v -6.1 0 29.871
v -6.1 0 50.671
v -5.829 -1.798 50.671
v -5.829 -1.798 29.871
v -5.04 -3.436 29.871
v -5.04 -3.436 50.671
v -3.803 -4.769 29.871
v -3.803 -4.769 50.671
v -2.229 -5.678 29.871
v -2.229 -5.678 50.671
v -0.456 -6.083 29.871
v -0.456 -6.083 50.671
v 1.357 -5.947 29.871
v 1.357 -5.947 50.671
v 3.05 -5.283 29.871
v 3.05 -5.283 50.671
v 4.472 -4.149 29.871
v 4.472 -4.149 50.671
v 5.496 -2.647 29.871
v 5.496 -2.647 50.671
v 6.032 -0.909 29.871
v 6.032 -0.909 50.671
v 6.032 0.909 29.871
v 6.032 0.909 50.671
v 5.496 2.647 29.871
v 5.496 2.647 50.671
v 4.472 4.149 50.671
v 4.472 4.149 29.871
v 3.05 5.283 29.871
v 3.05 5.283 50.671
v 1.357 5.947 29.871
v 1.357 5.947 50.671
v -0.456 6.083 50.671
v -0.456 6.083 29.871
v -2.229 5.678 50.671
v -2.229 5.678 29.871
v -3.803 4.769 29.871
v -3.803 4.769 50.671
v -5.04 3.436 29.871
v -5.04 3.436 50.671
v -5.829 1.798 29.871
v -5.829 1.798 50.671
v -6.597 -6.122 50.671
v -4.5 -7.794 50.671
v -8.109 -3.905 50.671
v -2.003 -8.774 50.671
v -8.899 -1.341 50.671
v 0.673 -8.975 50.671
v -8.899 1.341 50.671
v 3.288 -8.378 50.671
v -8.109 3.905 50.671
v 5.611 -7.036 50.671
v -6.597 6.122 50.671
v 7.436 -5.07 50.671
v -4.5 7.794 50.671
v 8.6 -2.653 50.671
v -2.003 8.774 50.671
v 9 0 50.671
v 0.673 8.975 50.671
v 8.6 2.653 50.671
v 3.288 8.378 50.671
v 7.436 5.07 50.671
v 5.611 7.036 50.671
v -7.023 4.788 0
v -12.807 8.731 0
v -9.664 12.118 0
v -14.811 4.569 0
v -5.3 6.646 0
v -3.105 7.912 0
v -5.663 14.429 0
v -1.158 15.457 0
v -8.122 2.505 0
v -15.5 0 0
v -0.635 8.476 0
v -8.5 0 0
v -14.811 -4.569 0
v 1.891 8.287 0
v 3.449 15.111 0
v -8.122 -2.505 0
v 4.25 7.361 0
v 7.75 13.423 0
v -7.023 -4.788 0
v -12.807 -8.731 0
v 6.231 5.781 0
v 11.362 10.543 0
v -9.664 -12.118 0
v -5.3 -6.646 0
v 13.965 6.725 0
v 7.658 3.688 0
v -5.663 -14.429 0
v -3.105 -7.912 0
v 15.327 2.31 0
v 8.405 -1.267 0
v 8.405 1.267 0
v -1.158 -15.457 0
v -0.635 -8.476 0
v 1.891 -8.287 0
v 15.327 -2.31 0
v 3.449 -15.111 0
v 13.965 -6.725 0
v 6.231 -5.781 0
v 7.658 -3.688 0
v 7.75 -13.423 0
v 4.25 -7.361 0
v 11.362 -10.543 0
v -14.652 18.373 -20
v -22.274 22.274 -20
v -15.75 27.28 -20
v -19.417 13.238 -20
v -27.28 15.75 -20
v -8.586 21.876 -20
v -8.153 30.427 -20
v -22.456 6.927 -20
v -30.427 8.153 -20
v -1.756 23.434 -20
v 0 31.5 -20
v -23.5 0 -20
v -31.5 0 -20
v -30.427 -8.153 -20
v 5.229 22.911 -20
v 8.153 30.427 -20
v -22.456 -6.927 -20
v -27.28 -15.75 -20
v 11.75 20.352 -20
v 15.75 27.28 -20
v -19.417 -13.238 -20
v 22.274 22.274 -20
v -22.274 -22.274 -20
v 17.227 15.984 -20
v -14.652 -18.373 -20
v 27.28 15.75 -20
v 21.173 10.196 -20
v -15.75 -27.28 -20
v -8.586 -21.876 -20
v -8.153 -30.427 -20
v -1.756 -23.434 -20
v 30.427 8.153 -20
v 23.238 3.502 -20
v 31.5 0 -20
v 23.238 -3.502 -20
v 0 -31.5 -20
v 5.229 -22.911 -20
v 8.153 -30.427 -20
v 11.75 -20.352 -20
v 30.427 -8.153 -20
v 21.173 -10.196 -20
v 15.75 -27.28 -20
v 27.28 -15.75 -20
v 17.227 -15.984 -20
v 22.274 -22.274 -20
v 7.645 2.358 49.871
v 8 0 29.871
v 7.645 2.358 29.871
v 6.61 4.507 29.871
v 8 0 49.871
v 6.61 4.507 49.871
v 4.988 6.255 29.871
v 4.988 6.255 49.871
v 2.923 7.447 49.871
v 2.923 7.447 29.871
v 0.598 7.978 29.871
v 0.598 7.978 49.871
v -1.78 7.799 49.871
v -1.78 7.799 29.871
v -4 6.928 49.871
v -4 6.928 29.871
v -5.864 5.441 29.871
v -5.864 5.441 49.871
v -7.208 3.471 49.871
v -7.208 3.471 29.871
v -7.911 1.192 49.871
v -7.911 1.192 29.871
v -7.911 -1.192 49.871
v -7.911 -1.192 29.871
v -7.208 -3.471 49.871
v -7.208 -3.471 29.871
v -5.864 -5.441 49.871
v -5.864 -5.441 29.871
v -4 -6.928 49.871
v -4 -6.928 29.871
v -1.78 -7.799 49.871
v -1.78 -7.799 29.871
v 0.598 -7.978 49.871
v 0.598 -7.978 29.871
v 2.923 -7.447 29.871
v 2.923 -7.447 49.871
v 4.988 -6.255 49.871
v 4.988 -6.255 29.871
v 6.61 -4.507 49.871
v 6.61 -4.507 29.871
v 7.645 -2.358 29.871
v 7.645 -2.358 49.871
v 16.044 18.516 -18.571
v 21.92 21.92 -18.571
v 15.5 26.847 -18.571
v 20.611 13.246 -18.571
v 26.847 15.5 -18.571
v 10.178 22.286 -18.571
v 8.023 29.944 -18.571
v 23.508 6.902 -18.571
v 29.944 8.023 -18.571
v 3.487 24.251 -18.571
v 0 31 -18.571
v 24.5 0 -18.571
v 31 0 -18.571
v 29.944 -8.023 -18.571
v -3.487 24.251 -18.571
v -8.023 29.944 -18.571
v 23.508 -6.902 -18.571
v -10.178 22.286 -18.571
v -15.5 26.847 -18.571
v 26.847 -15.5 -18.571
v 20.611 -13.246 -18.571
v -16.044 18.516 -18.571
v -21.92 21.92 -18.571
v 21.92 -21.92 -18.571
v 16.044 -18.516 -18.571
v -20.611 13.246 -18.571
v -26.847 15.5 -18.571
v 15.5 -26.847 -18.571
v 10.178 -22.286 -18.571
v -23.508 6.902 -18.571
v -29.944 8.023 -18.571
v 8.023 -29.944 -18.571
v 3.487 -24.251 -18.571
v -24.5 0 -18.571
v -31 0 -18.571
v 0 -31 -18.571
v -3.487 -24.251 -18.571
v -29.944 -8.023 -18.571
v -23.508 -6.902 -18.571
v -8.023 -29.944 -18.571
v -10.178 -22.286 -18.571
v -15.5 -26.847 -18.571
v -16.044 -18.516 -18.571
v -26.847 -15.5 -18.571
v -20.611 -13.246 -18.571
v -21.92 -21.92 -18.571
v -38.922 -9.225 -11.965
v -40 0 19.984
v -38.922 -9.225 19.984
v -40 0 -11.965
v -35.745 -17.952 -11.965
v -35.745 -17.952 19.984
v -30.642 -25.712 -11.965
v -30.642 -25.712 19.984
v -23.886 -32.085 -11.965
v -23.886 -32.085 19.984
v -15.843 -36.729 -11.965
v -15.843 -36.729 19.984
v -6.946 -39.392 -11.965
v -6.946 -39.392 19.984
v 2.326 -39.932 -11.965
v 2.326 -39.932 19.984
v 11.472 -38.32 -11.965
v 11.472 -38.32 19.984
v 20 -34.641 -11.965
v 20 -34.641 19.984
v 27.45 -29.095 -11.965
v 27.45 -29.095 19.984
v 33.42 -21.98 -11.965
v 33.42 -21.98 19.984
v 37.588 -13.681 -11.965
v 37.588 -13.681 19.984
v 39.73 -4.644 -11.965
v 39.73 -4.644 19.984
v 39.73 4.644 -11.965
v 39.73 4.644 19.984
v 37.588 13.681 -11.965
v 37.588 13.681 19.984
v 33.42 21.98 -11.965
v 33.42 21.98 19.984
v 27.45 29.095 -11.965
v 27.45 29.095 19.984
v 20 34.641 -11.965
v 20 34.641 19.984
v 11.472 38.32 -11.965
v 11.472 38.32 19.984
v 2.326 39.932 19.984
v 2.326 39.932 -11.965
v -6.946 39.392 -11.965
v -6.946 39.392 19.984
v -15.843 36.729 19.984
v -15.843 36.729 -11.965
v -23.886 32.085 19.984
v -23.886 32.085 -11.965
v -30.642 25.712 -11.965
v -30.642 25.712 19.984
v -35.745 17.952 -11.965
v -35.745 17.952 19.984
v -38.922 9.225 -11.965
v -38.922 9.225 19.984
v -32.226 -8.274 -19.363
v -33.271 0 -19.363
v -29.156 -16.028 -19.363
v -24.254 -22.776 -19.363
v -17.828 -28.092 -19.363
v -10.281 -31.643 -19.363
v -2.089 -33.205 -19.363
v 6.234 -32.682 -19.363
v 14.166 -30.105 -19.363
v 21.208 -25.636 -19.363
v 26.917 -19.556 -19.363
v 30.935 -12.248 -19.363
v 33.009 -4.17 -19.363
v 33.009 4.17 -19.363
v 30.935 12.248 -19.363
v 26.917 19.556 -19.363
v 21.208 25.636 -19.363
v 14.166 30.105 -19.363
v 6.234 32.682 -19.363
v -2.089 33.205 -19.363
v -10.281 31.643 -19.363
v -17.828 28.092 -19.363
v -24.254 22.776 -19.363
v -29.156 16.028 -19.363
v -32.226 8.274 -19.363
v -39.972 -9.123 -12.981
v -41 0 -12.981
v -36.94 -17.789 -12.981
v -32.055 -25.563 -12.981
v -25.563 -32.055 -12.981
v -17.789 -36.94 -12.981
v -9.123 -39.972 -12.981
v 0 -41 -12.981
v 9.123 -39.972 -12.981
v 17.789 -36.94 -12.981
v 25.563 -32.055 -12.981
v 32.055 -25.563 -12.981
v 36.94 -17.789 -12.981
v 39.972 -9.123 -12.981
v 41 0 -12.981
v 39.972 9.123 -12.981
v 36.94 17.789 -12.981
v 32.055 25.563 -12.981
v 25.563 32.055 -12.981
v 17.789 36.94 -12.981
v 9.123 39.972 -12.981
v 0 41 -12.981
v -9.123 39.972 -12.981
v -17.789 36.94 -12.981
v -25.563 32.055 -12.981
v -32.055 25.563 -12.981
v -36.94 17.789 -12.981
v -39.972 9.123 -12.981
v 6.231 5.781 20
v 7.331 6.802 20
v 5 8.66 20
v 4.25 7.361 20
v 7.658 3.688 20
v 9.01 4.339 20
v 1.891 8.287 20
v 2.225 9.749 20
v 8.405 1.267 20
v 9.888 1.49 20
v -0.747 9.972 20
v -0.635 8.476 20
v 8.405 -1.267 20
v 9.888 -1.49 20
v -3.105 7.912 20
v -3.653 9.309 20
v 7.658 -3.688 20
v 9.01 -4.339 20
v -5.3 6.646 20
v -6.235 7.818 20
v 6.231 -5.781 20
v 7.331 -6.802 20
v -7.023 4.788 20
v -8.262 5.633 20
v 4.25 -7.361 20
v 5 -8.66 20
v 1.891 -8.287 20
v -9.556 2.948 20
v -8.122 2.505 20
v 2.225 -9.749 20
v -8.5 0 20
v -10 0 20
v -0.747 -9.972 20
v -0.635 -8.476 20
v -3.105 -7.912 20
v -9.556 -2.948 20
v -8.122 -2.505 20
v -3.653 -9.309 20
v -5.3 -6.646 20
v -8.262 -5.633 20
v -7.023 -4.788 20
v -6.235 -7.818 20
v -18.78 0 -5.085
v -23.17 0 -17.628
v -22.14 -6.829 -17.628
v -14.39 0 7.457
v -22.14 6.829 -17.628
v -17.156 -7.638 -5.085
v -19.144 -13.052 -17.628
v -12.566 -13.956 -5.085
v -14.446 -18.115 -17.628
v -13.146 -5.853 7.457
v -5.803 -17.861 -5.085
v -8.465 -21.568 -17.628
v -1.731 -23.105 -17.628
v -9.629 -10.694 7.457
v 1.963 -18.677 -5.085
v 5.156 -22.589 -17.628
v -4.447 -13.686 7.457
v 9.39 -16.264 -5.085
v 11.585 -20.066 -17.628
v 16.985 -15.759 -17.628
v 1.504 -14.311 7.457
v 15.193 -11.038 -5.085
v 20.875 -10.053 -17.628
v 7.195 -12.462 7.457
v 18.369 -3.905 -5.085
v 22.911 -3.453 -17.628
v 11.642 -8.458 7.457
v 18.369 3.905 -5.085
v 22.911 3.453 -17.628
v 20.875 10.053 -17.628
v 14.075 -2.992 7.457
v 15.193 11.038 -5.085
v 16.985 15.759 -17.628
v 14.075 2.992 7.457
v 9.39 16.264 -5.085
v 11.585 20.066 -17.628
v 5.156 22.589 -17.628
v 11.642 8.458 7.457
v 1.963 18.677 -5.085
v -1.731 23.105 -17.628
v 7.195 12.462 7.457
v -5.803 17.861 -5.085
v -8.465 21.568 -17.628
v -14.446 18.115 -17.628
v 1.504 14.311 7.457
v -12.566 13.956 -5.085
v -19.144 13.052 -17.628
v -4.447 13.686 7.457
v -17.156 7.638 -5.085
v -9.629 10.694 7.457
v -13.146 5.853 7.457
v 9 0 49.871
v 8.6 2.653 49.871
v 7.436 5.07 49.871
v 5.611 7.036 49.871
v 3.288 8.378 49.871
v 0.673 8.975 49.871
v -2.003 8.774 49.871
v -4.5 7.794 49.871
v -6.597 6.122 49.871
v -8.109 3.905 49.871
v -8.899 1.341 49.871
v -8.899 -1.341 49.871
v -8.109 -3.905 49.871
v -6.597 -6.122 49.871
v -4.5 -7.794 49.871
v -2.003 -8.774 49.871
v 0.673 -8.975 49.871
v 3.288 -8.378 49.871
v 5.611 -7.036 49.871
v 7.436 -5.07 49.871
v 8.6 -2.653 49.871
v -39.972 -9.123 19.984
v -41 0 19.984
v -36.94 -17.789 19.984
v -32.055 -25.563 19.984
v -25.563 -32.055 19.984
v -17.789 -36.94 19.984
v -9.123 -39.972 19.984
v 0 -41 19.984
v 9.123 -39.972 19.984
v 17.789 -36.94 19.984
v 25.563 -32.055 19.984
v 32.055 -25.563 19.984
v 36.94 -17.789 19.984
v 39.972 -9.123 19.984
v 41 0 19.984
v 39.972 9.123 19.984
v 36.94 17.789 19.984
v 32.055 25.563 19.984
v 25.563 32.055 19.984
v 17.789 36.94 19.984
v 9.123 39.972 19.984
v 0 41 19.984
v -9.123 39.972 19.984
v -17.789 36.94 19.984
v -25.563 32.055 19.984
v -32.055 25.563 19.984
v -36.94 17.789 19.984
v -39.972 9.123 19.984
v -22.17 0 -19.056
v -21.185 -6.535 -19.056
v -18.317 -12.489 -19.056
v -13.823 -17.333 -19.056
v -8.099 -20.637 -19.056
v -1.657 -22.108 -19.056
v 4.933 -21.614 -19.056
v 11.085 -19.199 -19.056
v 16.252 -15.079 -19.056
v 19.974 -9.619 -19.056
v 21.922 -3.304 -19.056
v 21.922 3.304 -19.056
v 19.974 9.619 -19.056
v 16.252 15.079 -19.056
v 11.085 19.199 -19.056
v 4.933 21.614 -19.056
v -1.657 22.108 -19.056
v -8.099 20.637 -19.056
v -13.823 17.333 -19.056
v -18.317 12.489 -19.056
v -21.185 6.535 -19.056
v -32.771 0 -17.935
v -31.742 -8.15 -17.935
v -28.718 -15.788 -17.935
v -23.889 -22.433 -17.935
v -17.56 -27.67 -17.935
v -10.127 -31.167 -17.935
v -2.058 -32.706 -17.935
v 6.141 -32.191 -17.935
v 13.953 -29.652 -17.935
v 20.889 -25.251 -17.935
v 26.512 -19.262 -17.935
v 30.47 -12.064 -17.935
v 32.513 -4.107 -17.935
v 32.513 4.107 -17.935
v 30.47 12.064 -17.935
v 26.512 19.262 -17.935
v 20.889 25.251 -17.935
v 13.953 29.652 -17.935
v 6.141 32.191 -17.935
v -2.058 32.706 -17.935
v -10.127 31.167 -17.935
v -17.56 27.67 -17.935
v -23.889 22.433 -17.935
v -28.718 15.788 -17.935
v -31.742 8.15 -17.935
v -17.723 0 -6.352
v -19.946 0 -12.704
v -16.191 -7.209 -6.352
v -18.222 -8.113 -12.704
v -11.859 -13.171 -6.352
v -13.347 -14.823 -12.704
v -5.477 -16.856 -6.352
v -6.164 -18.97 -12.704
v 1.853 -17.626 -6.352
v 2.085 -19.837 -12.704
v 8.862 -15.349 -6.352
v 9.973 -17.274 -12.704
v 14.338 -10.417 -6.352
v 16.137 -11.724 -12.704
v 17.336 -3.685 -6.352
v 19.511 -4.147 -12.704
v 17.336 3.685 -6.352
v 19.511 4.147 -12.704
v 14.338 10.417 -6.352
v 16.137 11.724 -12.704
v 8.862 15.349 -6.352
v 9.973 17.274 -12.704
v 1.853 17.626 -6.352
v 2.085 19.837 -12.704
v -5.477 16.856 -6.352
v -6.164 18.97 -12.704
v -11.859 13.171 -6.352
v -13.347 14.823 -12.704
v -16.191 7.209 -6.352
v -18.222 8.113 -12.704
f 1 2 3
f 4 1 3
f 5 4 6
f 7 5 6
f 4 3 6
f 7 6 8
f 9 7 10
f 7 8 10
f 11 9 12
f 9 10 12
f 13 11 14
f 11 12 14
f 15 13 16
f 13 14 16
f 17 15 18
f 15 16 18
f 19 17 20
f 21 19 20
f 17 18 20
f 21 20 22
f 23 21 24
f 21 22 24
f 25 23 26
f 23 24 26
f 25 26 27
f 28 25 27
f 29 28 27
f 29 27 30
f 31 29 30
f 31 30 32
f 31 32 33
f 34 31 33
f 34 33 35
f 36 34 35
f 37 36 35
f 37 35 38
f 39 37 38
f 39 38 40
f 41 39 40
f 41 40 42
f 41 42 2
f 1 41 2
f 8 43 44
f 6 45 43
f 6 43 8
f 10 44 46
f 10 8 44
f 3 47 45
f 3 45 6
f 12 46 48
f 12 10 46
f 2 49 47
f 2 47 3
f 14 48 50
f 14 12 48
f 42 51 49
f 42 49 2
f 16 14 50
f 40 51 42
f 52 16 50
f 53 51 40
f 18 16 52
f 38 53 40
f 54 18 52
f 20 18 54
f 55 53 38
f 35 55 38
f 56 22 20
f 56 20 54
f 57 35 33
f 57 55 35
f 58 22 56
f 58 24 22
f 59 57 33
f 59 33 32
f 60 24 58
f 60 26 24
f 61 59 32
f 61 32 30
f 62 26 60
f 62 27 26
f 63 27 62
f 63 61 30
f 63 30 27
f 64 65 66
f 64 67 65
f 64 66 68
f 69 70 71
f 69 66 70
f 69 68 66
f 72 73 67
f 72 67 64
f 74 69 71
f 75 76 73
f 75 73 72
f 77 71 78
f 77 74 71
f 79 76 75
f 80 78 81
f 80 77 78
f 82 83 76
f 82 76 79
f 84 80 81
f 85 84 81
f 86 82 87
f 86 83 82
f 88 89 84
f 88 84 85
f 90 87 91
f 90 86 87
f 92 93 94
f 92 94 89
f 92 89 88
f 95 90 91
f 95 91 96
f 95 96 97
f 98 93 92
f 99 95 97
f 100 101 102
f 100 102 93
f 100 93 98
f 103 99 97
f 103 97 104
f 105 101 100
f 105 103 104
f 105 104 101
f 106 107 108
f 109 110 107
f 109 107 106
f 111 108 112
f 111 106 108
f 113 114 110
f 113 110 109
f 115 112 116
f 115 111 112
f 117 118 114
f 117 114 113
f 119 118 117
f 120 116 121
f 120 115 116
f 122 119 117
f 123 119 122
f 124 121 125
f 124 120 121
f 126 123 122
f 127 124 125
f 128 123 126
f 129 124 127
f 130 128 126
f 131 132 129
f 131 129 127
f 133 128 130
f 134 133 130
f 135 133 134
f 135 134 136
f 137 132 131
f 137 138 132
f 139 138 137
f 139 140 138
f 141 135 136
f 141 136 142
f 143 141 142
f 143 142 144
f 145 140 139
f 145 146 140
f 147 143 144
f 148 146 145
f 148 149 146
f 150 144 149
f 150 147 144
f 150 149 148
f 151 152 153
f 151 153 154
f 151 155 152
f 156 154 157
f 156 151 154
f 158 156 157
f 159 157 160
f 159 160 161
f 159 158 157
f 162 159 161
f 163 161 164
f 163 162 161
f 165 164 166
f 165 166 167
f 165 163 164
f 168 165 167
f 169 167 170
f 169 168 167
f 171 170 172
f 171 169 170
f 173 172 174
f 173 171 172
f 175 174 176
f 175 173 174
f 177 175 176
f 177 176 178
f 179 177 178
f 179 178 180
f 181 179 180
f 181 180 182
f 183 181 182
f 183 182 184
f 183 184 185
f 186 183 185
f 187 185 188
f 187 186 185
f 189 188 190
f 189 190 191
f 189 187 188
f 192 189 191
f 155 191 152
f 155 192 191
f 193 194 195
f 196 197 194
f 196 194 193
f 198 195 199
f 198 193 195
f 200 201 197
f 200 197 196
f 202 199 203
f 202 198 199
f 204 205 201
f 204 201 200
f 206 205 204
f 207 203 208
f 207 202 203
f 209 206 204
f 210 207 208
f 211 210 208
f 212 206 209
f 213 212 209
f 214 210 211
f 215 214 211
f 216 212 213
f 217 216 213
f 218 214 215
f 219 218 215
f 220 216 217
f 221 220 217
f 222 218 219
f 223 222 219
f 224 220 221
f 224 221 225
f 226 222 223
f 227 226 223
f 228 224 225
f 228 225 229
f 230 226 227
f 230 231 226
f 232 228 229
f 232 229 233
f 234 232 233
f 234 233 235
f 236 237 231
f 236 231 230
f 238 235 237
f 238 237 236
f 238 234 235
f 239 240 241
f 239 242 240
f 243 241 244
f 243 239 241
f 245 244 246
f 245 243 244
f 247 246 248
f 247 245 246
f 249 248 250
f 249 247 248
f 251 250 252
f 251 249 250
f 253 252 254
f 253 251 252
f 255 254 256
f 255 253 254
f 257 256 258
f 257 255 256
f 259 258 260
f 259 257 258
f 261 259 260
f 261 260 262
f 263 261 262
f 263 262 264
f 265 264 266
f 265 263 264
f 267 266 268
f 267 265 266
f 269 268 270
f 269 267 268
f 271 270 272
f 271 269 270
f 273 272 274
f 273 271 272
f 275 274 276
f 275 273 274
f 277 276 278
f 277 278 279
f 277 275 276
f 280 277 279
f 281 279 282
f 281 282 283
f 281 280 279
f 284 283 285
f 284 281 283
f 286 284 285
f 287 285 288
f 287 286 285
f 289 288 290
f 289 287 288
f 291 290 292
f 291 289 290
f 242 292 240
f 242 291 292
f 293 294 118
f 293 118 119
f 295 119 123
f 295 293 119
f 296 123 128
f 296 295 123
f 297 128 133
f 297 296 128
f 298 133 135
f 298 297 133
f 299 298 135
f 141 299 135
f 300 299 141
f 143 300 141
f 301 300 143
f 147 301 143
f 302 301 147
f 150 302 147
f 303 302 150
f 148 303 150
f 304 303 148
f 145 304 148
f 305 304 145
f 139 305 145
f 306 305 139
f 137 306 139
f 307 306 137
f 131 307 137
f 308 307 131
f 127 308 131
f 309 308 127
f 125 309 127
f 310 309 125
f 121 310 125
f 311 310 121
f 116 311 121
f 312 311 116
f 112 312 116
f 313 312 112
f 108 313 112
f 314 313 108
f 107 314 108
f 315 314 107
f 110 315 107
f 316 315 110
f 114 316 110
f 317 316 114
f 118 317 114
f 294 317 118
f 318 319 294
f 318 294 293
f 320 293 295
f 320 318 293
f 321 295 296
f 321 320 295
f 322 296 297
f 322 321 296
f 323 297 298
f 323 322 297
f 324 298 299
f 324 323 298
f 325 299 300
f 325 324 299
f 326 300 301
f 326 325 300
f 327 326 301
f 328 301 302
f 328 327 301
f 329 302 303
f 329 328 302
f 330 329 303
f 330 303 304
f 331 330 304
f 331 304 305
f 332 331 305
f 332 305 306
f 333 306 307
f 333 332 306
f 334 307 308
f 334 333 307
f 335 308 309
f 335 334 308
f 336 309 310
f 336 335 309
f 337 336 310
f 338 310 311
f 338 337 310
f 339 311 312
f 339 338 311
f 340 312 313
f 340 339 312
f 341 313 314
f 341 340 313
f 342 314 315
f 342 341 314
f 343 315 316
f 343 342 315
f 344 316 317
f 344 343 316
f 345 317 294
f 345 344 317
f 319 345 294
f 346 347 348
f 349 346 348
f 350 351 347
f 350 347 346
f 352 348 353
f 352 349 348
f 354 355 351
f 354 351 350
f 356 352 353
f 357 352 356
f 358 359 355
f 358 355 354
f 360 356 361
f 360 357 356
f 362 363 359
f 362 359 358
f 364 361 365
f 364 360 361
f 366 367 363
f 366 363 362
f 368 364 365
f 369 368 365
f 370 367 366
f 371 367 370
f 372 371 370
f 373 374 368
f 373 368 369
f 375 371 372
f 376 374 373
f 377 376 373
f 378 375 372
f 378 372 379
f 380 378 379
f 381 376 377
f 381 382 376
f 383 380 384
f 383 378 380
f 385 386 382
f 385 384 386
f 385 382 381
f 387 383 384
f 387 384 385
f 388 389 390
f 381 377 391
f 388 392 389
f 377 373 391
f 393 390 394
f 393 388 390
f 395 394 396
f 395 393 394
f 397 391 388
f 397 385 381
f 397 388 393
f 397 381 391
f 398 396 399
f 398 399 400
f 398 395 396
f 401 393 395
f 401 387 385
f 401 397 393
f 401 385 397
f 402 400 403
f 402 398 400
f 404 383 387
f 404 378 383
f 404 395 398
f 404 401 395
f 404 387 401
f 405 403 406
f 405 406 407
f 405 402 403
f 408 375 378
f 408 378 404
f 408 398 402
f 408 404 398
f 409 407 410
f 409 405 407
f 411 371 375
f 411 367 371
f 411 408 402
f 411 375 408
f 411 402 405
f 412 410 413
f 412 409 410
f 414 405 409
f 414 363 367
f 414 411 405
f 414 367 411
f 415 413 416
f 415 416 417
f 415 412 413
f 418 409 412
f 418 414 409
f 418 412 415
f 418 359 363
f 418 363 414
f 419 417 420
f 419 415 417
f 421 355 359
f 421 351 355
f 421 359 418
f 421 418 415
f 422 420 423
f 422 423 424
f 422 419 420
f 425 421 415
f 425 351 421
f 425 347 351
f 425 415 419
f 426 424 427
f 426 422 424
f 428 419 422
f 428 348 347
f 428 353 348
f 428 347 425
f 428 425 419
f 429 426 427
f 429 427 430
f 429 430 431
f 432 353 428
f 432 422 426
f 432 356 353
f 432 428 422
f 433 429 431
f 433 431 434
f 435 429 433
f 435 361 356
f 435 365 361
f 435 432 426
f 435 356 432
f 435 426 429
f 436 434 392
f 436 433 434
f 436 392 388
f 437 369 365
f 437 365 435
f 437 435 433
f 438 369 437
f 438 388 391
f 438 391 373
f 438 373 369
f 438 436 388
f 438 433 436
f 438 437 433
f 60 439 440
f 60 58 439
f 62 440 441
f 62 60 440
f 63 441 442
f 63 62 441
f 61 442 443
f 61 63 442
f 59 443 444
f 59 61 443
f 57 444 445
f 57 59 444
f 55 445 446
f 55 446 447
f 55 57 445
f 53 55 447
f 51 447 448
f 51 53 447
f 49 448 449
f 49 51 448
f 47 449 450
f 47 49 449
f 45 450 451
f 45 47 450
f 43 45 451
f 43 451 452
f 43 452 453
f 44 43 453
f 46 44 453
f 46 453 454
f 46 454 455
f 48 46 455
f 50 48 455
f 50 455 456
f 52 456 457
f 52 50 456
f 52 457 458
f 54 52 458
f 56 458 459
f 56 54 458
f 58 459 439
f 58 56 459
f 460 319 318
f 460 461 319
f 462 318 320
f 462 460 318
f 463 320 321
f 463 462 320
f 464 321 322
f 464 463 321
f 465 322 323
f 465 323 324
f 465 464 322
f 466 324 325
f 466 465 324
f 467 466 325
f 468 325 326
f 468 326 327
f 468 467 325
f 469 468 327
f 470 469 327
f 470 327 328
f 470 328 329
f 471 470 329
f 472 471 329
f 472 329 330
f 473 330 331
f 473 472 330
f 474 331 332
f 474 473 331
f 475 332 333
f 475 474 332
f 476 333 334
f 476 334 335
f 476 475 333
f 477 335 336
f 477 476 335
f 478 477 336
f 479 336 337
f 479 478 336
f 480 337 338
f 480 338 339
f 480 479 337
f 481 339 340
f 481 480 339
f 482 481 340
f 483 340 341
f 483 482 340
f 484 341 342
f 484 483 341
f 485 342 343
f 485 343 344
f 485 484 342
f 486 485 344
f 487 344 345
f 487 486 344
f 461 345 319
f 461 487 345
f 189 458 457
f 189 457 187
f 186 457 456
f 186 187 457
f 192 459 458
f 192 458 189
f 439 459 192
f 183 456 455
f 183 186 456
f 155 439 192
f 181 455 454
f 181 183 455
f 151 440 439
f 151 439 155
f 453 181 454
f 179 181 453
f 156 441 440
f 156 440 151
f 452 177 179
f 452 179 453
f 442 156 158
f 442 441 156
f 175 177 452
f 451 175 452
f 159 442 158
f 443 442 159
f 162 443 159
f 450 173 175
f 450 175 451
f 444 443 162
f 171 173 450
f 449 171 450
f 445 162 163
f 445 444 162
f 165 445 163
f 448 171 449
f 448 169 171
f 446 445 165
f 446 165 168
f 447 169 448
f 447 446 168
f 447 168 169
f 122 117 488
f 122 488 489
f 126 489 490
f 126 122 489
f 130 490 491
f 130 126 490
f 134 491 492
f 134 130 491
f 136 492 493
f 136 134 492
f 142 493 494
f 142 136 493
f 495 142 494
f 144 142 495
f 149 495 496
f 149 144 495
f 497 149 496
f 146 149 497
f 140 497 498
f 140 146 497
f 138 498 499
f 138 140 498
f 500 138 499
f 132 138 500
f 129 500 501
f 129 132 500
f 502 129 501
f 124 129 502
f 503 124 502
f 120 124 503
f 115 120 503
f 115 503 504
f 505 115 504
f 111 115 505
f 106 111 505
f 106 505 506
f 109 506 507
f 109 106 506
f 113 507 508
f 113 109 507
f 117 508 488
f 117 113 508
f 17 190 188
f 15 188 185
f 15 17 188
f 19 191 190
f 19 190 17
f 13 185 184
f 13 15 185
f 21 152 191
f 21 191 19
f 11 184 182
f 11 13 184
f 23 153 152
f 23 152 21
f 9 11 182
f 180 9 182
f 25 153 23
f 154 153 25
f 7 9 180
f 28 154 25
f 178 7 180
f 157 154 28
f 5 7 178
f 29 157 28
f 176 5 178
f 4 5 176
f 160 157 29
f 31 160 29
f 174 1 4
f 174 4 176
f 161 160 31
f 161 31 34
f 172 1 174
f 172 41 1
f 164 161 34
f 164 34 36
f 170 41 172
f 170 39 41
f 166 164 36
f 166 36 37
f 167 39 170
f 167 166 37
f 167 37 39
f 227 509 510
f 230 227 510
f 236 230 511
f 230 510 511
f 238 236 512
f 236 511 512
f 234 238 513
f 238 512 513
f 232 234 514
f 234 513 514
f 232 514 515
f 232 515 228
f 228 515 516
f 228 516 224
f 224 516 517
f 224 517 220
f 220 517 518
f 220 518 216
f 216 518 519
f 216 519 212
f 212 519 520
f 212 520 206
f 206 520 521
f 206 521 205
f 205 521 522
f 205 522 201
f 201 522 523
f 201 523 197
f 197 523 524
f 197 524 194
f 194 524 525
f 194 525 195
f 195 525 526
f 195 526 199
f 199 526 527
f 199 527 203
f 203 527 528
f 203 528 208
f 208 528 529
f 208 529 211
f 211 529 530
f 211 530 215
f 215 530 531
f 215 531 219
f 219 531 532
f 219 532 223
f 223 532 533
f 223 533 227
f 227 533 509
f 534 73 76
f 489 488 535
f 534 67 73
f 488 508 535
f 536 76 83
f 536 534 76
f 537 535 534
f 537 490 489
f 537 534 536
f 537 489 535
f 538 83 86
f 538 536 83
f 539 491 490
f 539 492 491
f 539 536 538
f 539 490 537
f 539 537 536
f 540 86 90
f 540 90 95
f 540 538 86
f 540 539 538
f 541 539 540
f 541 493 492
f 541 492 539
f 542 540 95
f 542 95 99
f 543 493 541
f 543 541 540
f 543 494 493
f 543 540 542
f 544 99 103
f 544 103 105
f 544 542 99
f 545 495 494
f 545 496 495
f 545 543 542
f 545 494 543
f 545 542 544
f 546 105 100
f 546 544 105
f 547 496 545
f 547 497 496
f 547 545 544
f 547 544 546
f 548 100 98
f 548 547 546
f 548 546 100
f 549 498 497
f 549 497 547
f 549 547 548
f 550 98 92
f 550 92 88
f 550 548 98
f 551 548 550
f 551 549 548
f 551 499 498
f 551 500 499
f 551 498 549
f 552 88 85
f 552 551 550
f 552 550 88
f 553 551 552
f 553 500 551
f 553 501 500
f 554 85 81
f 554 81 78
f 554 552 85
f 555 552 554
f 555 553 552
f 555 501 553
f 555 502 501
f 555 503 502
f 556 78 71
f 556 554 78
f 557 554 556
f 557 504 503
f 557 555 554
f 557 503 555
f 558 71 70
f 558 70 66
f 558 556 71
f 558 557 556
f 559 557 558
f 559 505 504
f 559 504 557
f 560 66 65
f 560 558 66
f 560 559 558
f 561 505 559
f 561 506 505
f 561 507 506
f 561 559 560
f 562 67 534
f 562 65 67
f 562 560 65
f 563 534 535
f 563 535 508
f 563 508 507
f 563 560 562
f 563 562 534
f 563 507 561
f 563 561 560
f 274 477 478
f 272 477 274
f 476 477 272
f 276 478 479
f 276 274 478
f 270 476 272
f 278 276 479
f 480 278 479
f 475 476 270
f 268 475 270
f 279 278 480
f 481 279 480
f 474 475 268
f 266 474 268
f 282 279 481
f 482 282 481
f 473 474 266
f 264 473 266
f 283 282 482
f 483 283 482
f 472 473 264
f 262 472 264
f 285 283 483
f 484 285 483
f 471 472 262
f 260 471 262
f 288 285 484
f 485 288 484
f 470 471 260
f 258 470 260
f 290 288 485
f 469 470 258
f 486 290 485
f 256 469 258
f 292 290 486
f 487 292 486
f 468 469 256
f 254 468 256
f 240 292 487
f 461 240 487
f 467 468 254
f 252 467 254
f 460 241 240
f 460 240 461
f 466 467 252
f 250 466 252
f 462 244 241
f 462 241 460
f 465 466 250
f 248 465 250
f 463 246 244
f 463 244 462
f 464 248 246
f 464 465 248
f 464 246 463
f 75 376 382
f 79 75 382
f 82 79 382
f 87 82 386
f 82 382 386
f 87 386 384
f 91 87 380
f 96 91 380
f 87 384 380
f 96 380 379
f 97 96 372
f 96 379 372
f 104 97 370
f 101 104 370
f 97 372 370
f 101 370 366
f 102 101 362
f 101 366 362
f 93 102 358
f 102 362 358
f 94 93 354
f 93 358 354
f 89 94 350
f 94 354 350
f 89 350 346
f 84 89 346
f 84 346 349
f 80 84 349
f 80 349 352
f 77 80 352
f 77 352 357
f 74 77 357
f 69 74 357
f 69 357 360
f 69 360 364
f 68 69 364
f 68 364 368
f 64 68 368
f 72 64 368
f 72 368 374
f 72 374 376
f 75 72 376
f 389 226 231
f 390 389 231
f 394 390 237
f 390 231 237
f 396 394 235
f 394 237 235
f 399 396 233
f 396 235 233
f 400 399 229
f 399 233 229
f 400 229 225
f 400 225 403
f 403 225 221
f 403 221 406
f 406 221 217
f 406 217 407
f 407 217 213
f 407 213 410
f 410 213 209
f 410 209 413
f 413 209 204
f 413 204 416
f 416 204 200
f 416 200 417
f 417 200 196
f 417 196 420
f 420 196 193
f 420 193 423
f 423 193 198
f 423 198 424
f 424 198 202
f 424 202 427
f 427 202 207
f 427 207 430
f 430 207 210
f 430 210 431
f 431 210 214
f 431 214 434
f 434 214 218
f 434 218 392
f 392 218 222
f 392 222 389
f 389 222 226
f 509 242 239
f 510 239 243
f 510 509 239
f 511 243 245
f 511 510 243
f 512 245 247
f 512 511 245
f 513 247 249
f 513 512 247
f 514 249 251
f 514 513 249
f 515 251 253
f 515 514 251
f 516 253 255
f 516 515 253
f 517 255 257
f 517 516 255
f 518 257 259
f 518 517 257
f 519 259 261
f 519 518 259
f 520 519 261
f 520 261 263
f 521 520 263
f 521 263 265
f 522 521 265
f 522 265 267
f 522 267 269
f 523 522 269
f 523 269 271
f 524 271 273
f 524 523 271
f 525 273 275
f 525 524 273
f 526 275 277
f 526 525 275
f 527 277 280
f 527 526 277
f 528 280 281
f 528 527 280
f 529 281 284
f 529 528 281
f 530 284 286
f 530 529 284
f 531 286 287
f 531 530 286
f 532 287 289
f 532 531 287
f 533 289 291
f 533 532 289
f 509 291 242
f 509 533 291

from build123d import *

# Parameters (mm, degrees)
SKETCH001_R     = 8.5
POCKET_DEPTH    = 40.001
CHAMFER_SIZE    = 1
CHAMFER001_SIZE = 1
SKETCH003_R     = 6.1
POCKET001_DEPTH = 20.801


with BuildPart() as miska:
    # Sketch → Revolution (revolve)
    with BuildSketch(Plane.XZ):
        Polygon((0, 0), (-15.5, 0), (-22.5, -20), (-32.5, -20), (-41, -12.980809), (-41, 19.983914), (-40, 19.983914), (-40, -11.965131), (-32, -18.571429), (-23.5, -18.571429), (-10, 20), (0, 20), align=None)
    revolve(axis=Axis((0, 0, 0), (0, 0, 1)))

    # Sketch001 (on Face4 of Revolution) → Pocket (cut, through all)
    with BuildSketch(Plane(origin=(0, 0, 20), x_dir=(-1, 0, 0), z_dir=(0, 0, 1))):
        Circle(SKETCH001_R)
    extrude(amount=-POCKET_DEPTH, mode=Mode.SUBTRACT)

    # Chamfer
    chamfer_edges = [miska.edges().sort_by_distance(p)[0] for p in [
        (22.5, 0, -20),
        (32.5, 0, -20),
    ]]
    chamfer(chamfer_edges, length=CHAMFER_SIZE)

    # Chamfer001
    chamfer001_edges = [miska.edges().sort_by_distance(p)[0] for p in [
        (32, 0, -18.571429),
        (23.5, 0, -18.571429),
    ]]
    chamfer(chamfer001_edges, length=CHAMFER001_SIZE)


with BuildPart() as podlo_ka:
    # Sketch002 → Revolution001 (revolve)
    with BuildSketch(Plane.XZ):
        Polygon((0, 29.870868), (8, 29.870868), (8, 49.870868), (9, 49.870868), (9, 50.670868), (0, 50.670868), align=None)
    revolve(axis=Axis((0, 0, 0), (0, 0, 1)))

    # Sketch003 (on Face5 of Revolution001) → Pocket001 (cut, through all)
    with BuildSketch(Plane(origin=(0, 0, 50.670868), x_dir=(-1, 0, 0), z_dir=(0, 0, 1))):
        Circle(SKETCH003_R)
    extrude(amount=-POCKET001_DEPTH, mode=Mode.SUBTRACT)


solid = Compound([miska.part, podlo_ka.part])
